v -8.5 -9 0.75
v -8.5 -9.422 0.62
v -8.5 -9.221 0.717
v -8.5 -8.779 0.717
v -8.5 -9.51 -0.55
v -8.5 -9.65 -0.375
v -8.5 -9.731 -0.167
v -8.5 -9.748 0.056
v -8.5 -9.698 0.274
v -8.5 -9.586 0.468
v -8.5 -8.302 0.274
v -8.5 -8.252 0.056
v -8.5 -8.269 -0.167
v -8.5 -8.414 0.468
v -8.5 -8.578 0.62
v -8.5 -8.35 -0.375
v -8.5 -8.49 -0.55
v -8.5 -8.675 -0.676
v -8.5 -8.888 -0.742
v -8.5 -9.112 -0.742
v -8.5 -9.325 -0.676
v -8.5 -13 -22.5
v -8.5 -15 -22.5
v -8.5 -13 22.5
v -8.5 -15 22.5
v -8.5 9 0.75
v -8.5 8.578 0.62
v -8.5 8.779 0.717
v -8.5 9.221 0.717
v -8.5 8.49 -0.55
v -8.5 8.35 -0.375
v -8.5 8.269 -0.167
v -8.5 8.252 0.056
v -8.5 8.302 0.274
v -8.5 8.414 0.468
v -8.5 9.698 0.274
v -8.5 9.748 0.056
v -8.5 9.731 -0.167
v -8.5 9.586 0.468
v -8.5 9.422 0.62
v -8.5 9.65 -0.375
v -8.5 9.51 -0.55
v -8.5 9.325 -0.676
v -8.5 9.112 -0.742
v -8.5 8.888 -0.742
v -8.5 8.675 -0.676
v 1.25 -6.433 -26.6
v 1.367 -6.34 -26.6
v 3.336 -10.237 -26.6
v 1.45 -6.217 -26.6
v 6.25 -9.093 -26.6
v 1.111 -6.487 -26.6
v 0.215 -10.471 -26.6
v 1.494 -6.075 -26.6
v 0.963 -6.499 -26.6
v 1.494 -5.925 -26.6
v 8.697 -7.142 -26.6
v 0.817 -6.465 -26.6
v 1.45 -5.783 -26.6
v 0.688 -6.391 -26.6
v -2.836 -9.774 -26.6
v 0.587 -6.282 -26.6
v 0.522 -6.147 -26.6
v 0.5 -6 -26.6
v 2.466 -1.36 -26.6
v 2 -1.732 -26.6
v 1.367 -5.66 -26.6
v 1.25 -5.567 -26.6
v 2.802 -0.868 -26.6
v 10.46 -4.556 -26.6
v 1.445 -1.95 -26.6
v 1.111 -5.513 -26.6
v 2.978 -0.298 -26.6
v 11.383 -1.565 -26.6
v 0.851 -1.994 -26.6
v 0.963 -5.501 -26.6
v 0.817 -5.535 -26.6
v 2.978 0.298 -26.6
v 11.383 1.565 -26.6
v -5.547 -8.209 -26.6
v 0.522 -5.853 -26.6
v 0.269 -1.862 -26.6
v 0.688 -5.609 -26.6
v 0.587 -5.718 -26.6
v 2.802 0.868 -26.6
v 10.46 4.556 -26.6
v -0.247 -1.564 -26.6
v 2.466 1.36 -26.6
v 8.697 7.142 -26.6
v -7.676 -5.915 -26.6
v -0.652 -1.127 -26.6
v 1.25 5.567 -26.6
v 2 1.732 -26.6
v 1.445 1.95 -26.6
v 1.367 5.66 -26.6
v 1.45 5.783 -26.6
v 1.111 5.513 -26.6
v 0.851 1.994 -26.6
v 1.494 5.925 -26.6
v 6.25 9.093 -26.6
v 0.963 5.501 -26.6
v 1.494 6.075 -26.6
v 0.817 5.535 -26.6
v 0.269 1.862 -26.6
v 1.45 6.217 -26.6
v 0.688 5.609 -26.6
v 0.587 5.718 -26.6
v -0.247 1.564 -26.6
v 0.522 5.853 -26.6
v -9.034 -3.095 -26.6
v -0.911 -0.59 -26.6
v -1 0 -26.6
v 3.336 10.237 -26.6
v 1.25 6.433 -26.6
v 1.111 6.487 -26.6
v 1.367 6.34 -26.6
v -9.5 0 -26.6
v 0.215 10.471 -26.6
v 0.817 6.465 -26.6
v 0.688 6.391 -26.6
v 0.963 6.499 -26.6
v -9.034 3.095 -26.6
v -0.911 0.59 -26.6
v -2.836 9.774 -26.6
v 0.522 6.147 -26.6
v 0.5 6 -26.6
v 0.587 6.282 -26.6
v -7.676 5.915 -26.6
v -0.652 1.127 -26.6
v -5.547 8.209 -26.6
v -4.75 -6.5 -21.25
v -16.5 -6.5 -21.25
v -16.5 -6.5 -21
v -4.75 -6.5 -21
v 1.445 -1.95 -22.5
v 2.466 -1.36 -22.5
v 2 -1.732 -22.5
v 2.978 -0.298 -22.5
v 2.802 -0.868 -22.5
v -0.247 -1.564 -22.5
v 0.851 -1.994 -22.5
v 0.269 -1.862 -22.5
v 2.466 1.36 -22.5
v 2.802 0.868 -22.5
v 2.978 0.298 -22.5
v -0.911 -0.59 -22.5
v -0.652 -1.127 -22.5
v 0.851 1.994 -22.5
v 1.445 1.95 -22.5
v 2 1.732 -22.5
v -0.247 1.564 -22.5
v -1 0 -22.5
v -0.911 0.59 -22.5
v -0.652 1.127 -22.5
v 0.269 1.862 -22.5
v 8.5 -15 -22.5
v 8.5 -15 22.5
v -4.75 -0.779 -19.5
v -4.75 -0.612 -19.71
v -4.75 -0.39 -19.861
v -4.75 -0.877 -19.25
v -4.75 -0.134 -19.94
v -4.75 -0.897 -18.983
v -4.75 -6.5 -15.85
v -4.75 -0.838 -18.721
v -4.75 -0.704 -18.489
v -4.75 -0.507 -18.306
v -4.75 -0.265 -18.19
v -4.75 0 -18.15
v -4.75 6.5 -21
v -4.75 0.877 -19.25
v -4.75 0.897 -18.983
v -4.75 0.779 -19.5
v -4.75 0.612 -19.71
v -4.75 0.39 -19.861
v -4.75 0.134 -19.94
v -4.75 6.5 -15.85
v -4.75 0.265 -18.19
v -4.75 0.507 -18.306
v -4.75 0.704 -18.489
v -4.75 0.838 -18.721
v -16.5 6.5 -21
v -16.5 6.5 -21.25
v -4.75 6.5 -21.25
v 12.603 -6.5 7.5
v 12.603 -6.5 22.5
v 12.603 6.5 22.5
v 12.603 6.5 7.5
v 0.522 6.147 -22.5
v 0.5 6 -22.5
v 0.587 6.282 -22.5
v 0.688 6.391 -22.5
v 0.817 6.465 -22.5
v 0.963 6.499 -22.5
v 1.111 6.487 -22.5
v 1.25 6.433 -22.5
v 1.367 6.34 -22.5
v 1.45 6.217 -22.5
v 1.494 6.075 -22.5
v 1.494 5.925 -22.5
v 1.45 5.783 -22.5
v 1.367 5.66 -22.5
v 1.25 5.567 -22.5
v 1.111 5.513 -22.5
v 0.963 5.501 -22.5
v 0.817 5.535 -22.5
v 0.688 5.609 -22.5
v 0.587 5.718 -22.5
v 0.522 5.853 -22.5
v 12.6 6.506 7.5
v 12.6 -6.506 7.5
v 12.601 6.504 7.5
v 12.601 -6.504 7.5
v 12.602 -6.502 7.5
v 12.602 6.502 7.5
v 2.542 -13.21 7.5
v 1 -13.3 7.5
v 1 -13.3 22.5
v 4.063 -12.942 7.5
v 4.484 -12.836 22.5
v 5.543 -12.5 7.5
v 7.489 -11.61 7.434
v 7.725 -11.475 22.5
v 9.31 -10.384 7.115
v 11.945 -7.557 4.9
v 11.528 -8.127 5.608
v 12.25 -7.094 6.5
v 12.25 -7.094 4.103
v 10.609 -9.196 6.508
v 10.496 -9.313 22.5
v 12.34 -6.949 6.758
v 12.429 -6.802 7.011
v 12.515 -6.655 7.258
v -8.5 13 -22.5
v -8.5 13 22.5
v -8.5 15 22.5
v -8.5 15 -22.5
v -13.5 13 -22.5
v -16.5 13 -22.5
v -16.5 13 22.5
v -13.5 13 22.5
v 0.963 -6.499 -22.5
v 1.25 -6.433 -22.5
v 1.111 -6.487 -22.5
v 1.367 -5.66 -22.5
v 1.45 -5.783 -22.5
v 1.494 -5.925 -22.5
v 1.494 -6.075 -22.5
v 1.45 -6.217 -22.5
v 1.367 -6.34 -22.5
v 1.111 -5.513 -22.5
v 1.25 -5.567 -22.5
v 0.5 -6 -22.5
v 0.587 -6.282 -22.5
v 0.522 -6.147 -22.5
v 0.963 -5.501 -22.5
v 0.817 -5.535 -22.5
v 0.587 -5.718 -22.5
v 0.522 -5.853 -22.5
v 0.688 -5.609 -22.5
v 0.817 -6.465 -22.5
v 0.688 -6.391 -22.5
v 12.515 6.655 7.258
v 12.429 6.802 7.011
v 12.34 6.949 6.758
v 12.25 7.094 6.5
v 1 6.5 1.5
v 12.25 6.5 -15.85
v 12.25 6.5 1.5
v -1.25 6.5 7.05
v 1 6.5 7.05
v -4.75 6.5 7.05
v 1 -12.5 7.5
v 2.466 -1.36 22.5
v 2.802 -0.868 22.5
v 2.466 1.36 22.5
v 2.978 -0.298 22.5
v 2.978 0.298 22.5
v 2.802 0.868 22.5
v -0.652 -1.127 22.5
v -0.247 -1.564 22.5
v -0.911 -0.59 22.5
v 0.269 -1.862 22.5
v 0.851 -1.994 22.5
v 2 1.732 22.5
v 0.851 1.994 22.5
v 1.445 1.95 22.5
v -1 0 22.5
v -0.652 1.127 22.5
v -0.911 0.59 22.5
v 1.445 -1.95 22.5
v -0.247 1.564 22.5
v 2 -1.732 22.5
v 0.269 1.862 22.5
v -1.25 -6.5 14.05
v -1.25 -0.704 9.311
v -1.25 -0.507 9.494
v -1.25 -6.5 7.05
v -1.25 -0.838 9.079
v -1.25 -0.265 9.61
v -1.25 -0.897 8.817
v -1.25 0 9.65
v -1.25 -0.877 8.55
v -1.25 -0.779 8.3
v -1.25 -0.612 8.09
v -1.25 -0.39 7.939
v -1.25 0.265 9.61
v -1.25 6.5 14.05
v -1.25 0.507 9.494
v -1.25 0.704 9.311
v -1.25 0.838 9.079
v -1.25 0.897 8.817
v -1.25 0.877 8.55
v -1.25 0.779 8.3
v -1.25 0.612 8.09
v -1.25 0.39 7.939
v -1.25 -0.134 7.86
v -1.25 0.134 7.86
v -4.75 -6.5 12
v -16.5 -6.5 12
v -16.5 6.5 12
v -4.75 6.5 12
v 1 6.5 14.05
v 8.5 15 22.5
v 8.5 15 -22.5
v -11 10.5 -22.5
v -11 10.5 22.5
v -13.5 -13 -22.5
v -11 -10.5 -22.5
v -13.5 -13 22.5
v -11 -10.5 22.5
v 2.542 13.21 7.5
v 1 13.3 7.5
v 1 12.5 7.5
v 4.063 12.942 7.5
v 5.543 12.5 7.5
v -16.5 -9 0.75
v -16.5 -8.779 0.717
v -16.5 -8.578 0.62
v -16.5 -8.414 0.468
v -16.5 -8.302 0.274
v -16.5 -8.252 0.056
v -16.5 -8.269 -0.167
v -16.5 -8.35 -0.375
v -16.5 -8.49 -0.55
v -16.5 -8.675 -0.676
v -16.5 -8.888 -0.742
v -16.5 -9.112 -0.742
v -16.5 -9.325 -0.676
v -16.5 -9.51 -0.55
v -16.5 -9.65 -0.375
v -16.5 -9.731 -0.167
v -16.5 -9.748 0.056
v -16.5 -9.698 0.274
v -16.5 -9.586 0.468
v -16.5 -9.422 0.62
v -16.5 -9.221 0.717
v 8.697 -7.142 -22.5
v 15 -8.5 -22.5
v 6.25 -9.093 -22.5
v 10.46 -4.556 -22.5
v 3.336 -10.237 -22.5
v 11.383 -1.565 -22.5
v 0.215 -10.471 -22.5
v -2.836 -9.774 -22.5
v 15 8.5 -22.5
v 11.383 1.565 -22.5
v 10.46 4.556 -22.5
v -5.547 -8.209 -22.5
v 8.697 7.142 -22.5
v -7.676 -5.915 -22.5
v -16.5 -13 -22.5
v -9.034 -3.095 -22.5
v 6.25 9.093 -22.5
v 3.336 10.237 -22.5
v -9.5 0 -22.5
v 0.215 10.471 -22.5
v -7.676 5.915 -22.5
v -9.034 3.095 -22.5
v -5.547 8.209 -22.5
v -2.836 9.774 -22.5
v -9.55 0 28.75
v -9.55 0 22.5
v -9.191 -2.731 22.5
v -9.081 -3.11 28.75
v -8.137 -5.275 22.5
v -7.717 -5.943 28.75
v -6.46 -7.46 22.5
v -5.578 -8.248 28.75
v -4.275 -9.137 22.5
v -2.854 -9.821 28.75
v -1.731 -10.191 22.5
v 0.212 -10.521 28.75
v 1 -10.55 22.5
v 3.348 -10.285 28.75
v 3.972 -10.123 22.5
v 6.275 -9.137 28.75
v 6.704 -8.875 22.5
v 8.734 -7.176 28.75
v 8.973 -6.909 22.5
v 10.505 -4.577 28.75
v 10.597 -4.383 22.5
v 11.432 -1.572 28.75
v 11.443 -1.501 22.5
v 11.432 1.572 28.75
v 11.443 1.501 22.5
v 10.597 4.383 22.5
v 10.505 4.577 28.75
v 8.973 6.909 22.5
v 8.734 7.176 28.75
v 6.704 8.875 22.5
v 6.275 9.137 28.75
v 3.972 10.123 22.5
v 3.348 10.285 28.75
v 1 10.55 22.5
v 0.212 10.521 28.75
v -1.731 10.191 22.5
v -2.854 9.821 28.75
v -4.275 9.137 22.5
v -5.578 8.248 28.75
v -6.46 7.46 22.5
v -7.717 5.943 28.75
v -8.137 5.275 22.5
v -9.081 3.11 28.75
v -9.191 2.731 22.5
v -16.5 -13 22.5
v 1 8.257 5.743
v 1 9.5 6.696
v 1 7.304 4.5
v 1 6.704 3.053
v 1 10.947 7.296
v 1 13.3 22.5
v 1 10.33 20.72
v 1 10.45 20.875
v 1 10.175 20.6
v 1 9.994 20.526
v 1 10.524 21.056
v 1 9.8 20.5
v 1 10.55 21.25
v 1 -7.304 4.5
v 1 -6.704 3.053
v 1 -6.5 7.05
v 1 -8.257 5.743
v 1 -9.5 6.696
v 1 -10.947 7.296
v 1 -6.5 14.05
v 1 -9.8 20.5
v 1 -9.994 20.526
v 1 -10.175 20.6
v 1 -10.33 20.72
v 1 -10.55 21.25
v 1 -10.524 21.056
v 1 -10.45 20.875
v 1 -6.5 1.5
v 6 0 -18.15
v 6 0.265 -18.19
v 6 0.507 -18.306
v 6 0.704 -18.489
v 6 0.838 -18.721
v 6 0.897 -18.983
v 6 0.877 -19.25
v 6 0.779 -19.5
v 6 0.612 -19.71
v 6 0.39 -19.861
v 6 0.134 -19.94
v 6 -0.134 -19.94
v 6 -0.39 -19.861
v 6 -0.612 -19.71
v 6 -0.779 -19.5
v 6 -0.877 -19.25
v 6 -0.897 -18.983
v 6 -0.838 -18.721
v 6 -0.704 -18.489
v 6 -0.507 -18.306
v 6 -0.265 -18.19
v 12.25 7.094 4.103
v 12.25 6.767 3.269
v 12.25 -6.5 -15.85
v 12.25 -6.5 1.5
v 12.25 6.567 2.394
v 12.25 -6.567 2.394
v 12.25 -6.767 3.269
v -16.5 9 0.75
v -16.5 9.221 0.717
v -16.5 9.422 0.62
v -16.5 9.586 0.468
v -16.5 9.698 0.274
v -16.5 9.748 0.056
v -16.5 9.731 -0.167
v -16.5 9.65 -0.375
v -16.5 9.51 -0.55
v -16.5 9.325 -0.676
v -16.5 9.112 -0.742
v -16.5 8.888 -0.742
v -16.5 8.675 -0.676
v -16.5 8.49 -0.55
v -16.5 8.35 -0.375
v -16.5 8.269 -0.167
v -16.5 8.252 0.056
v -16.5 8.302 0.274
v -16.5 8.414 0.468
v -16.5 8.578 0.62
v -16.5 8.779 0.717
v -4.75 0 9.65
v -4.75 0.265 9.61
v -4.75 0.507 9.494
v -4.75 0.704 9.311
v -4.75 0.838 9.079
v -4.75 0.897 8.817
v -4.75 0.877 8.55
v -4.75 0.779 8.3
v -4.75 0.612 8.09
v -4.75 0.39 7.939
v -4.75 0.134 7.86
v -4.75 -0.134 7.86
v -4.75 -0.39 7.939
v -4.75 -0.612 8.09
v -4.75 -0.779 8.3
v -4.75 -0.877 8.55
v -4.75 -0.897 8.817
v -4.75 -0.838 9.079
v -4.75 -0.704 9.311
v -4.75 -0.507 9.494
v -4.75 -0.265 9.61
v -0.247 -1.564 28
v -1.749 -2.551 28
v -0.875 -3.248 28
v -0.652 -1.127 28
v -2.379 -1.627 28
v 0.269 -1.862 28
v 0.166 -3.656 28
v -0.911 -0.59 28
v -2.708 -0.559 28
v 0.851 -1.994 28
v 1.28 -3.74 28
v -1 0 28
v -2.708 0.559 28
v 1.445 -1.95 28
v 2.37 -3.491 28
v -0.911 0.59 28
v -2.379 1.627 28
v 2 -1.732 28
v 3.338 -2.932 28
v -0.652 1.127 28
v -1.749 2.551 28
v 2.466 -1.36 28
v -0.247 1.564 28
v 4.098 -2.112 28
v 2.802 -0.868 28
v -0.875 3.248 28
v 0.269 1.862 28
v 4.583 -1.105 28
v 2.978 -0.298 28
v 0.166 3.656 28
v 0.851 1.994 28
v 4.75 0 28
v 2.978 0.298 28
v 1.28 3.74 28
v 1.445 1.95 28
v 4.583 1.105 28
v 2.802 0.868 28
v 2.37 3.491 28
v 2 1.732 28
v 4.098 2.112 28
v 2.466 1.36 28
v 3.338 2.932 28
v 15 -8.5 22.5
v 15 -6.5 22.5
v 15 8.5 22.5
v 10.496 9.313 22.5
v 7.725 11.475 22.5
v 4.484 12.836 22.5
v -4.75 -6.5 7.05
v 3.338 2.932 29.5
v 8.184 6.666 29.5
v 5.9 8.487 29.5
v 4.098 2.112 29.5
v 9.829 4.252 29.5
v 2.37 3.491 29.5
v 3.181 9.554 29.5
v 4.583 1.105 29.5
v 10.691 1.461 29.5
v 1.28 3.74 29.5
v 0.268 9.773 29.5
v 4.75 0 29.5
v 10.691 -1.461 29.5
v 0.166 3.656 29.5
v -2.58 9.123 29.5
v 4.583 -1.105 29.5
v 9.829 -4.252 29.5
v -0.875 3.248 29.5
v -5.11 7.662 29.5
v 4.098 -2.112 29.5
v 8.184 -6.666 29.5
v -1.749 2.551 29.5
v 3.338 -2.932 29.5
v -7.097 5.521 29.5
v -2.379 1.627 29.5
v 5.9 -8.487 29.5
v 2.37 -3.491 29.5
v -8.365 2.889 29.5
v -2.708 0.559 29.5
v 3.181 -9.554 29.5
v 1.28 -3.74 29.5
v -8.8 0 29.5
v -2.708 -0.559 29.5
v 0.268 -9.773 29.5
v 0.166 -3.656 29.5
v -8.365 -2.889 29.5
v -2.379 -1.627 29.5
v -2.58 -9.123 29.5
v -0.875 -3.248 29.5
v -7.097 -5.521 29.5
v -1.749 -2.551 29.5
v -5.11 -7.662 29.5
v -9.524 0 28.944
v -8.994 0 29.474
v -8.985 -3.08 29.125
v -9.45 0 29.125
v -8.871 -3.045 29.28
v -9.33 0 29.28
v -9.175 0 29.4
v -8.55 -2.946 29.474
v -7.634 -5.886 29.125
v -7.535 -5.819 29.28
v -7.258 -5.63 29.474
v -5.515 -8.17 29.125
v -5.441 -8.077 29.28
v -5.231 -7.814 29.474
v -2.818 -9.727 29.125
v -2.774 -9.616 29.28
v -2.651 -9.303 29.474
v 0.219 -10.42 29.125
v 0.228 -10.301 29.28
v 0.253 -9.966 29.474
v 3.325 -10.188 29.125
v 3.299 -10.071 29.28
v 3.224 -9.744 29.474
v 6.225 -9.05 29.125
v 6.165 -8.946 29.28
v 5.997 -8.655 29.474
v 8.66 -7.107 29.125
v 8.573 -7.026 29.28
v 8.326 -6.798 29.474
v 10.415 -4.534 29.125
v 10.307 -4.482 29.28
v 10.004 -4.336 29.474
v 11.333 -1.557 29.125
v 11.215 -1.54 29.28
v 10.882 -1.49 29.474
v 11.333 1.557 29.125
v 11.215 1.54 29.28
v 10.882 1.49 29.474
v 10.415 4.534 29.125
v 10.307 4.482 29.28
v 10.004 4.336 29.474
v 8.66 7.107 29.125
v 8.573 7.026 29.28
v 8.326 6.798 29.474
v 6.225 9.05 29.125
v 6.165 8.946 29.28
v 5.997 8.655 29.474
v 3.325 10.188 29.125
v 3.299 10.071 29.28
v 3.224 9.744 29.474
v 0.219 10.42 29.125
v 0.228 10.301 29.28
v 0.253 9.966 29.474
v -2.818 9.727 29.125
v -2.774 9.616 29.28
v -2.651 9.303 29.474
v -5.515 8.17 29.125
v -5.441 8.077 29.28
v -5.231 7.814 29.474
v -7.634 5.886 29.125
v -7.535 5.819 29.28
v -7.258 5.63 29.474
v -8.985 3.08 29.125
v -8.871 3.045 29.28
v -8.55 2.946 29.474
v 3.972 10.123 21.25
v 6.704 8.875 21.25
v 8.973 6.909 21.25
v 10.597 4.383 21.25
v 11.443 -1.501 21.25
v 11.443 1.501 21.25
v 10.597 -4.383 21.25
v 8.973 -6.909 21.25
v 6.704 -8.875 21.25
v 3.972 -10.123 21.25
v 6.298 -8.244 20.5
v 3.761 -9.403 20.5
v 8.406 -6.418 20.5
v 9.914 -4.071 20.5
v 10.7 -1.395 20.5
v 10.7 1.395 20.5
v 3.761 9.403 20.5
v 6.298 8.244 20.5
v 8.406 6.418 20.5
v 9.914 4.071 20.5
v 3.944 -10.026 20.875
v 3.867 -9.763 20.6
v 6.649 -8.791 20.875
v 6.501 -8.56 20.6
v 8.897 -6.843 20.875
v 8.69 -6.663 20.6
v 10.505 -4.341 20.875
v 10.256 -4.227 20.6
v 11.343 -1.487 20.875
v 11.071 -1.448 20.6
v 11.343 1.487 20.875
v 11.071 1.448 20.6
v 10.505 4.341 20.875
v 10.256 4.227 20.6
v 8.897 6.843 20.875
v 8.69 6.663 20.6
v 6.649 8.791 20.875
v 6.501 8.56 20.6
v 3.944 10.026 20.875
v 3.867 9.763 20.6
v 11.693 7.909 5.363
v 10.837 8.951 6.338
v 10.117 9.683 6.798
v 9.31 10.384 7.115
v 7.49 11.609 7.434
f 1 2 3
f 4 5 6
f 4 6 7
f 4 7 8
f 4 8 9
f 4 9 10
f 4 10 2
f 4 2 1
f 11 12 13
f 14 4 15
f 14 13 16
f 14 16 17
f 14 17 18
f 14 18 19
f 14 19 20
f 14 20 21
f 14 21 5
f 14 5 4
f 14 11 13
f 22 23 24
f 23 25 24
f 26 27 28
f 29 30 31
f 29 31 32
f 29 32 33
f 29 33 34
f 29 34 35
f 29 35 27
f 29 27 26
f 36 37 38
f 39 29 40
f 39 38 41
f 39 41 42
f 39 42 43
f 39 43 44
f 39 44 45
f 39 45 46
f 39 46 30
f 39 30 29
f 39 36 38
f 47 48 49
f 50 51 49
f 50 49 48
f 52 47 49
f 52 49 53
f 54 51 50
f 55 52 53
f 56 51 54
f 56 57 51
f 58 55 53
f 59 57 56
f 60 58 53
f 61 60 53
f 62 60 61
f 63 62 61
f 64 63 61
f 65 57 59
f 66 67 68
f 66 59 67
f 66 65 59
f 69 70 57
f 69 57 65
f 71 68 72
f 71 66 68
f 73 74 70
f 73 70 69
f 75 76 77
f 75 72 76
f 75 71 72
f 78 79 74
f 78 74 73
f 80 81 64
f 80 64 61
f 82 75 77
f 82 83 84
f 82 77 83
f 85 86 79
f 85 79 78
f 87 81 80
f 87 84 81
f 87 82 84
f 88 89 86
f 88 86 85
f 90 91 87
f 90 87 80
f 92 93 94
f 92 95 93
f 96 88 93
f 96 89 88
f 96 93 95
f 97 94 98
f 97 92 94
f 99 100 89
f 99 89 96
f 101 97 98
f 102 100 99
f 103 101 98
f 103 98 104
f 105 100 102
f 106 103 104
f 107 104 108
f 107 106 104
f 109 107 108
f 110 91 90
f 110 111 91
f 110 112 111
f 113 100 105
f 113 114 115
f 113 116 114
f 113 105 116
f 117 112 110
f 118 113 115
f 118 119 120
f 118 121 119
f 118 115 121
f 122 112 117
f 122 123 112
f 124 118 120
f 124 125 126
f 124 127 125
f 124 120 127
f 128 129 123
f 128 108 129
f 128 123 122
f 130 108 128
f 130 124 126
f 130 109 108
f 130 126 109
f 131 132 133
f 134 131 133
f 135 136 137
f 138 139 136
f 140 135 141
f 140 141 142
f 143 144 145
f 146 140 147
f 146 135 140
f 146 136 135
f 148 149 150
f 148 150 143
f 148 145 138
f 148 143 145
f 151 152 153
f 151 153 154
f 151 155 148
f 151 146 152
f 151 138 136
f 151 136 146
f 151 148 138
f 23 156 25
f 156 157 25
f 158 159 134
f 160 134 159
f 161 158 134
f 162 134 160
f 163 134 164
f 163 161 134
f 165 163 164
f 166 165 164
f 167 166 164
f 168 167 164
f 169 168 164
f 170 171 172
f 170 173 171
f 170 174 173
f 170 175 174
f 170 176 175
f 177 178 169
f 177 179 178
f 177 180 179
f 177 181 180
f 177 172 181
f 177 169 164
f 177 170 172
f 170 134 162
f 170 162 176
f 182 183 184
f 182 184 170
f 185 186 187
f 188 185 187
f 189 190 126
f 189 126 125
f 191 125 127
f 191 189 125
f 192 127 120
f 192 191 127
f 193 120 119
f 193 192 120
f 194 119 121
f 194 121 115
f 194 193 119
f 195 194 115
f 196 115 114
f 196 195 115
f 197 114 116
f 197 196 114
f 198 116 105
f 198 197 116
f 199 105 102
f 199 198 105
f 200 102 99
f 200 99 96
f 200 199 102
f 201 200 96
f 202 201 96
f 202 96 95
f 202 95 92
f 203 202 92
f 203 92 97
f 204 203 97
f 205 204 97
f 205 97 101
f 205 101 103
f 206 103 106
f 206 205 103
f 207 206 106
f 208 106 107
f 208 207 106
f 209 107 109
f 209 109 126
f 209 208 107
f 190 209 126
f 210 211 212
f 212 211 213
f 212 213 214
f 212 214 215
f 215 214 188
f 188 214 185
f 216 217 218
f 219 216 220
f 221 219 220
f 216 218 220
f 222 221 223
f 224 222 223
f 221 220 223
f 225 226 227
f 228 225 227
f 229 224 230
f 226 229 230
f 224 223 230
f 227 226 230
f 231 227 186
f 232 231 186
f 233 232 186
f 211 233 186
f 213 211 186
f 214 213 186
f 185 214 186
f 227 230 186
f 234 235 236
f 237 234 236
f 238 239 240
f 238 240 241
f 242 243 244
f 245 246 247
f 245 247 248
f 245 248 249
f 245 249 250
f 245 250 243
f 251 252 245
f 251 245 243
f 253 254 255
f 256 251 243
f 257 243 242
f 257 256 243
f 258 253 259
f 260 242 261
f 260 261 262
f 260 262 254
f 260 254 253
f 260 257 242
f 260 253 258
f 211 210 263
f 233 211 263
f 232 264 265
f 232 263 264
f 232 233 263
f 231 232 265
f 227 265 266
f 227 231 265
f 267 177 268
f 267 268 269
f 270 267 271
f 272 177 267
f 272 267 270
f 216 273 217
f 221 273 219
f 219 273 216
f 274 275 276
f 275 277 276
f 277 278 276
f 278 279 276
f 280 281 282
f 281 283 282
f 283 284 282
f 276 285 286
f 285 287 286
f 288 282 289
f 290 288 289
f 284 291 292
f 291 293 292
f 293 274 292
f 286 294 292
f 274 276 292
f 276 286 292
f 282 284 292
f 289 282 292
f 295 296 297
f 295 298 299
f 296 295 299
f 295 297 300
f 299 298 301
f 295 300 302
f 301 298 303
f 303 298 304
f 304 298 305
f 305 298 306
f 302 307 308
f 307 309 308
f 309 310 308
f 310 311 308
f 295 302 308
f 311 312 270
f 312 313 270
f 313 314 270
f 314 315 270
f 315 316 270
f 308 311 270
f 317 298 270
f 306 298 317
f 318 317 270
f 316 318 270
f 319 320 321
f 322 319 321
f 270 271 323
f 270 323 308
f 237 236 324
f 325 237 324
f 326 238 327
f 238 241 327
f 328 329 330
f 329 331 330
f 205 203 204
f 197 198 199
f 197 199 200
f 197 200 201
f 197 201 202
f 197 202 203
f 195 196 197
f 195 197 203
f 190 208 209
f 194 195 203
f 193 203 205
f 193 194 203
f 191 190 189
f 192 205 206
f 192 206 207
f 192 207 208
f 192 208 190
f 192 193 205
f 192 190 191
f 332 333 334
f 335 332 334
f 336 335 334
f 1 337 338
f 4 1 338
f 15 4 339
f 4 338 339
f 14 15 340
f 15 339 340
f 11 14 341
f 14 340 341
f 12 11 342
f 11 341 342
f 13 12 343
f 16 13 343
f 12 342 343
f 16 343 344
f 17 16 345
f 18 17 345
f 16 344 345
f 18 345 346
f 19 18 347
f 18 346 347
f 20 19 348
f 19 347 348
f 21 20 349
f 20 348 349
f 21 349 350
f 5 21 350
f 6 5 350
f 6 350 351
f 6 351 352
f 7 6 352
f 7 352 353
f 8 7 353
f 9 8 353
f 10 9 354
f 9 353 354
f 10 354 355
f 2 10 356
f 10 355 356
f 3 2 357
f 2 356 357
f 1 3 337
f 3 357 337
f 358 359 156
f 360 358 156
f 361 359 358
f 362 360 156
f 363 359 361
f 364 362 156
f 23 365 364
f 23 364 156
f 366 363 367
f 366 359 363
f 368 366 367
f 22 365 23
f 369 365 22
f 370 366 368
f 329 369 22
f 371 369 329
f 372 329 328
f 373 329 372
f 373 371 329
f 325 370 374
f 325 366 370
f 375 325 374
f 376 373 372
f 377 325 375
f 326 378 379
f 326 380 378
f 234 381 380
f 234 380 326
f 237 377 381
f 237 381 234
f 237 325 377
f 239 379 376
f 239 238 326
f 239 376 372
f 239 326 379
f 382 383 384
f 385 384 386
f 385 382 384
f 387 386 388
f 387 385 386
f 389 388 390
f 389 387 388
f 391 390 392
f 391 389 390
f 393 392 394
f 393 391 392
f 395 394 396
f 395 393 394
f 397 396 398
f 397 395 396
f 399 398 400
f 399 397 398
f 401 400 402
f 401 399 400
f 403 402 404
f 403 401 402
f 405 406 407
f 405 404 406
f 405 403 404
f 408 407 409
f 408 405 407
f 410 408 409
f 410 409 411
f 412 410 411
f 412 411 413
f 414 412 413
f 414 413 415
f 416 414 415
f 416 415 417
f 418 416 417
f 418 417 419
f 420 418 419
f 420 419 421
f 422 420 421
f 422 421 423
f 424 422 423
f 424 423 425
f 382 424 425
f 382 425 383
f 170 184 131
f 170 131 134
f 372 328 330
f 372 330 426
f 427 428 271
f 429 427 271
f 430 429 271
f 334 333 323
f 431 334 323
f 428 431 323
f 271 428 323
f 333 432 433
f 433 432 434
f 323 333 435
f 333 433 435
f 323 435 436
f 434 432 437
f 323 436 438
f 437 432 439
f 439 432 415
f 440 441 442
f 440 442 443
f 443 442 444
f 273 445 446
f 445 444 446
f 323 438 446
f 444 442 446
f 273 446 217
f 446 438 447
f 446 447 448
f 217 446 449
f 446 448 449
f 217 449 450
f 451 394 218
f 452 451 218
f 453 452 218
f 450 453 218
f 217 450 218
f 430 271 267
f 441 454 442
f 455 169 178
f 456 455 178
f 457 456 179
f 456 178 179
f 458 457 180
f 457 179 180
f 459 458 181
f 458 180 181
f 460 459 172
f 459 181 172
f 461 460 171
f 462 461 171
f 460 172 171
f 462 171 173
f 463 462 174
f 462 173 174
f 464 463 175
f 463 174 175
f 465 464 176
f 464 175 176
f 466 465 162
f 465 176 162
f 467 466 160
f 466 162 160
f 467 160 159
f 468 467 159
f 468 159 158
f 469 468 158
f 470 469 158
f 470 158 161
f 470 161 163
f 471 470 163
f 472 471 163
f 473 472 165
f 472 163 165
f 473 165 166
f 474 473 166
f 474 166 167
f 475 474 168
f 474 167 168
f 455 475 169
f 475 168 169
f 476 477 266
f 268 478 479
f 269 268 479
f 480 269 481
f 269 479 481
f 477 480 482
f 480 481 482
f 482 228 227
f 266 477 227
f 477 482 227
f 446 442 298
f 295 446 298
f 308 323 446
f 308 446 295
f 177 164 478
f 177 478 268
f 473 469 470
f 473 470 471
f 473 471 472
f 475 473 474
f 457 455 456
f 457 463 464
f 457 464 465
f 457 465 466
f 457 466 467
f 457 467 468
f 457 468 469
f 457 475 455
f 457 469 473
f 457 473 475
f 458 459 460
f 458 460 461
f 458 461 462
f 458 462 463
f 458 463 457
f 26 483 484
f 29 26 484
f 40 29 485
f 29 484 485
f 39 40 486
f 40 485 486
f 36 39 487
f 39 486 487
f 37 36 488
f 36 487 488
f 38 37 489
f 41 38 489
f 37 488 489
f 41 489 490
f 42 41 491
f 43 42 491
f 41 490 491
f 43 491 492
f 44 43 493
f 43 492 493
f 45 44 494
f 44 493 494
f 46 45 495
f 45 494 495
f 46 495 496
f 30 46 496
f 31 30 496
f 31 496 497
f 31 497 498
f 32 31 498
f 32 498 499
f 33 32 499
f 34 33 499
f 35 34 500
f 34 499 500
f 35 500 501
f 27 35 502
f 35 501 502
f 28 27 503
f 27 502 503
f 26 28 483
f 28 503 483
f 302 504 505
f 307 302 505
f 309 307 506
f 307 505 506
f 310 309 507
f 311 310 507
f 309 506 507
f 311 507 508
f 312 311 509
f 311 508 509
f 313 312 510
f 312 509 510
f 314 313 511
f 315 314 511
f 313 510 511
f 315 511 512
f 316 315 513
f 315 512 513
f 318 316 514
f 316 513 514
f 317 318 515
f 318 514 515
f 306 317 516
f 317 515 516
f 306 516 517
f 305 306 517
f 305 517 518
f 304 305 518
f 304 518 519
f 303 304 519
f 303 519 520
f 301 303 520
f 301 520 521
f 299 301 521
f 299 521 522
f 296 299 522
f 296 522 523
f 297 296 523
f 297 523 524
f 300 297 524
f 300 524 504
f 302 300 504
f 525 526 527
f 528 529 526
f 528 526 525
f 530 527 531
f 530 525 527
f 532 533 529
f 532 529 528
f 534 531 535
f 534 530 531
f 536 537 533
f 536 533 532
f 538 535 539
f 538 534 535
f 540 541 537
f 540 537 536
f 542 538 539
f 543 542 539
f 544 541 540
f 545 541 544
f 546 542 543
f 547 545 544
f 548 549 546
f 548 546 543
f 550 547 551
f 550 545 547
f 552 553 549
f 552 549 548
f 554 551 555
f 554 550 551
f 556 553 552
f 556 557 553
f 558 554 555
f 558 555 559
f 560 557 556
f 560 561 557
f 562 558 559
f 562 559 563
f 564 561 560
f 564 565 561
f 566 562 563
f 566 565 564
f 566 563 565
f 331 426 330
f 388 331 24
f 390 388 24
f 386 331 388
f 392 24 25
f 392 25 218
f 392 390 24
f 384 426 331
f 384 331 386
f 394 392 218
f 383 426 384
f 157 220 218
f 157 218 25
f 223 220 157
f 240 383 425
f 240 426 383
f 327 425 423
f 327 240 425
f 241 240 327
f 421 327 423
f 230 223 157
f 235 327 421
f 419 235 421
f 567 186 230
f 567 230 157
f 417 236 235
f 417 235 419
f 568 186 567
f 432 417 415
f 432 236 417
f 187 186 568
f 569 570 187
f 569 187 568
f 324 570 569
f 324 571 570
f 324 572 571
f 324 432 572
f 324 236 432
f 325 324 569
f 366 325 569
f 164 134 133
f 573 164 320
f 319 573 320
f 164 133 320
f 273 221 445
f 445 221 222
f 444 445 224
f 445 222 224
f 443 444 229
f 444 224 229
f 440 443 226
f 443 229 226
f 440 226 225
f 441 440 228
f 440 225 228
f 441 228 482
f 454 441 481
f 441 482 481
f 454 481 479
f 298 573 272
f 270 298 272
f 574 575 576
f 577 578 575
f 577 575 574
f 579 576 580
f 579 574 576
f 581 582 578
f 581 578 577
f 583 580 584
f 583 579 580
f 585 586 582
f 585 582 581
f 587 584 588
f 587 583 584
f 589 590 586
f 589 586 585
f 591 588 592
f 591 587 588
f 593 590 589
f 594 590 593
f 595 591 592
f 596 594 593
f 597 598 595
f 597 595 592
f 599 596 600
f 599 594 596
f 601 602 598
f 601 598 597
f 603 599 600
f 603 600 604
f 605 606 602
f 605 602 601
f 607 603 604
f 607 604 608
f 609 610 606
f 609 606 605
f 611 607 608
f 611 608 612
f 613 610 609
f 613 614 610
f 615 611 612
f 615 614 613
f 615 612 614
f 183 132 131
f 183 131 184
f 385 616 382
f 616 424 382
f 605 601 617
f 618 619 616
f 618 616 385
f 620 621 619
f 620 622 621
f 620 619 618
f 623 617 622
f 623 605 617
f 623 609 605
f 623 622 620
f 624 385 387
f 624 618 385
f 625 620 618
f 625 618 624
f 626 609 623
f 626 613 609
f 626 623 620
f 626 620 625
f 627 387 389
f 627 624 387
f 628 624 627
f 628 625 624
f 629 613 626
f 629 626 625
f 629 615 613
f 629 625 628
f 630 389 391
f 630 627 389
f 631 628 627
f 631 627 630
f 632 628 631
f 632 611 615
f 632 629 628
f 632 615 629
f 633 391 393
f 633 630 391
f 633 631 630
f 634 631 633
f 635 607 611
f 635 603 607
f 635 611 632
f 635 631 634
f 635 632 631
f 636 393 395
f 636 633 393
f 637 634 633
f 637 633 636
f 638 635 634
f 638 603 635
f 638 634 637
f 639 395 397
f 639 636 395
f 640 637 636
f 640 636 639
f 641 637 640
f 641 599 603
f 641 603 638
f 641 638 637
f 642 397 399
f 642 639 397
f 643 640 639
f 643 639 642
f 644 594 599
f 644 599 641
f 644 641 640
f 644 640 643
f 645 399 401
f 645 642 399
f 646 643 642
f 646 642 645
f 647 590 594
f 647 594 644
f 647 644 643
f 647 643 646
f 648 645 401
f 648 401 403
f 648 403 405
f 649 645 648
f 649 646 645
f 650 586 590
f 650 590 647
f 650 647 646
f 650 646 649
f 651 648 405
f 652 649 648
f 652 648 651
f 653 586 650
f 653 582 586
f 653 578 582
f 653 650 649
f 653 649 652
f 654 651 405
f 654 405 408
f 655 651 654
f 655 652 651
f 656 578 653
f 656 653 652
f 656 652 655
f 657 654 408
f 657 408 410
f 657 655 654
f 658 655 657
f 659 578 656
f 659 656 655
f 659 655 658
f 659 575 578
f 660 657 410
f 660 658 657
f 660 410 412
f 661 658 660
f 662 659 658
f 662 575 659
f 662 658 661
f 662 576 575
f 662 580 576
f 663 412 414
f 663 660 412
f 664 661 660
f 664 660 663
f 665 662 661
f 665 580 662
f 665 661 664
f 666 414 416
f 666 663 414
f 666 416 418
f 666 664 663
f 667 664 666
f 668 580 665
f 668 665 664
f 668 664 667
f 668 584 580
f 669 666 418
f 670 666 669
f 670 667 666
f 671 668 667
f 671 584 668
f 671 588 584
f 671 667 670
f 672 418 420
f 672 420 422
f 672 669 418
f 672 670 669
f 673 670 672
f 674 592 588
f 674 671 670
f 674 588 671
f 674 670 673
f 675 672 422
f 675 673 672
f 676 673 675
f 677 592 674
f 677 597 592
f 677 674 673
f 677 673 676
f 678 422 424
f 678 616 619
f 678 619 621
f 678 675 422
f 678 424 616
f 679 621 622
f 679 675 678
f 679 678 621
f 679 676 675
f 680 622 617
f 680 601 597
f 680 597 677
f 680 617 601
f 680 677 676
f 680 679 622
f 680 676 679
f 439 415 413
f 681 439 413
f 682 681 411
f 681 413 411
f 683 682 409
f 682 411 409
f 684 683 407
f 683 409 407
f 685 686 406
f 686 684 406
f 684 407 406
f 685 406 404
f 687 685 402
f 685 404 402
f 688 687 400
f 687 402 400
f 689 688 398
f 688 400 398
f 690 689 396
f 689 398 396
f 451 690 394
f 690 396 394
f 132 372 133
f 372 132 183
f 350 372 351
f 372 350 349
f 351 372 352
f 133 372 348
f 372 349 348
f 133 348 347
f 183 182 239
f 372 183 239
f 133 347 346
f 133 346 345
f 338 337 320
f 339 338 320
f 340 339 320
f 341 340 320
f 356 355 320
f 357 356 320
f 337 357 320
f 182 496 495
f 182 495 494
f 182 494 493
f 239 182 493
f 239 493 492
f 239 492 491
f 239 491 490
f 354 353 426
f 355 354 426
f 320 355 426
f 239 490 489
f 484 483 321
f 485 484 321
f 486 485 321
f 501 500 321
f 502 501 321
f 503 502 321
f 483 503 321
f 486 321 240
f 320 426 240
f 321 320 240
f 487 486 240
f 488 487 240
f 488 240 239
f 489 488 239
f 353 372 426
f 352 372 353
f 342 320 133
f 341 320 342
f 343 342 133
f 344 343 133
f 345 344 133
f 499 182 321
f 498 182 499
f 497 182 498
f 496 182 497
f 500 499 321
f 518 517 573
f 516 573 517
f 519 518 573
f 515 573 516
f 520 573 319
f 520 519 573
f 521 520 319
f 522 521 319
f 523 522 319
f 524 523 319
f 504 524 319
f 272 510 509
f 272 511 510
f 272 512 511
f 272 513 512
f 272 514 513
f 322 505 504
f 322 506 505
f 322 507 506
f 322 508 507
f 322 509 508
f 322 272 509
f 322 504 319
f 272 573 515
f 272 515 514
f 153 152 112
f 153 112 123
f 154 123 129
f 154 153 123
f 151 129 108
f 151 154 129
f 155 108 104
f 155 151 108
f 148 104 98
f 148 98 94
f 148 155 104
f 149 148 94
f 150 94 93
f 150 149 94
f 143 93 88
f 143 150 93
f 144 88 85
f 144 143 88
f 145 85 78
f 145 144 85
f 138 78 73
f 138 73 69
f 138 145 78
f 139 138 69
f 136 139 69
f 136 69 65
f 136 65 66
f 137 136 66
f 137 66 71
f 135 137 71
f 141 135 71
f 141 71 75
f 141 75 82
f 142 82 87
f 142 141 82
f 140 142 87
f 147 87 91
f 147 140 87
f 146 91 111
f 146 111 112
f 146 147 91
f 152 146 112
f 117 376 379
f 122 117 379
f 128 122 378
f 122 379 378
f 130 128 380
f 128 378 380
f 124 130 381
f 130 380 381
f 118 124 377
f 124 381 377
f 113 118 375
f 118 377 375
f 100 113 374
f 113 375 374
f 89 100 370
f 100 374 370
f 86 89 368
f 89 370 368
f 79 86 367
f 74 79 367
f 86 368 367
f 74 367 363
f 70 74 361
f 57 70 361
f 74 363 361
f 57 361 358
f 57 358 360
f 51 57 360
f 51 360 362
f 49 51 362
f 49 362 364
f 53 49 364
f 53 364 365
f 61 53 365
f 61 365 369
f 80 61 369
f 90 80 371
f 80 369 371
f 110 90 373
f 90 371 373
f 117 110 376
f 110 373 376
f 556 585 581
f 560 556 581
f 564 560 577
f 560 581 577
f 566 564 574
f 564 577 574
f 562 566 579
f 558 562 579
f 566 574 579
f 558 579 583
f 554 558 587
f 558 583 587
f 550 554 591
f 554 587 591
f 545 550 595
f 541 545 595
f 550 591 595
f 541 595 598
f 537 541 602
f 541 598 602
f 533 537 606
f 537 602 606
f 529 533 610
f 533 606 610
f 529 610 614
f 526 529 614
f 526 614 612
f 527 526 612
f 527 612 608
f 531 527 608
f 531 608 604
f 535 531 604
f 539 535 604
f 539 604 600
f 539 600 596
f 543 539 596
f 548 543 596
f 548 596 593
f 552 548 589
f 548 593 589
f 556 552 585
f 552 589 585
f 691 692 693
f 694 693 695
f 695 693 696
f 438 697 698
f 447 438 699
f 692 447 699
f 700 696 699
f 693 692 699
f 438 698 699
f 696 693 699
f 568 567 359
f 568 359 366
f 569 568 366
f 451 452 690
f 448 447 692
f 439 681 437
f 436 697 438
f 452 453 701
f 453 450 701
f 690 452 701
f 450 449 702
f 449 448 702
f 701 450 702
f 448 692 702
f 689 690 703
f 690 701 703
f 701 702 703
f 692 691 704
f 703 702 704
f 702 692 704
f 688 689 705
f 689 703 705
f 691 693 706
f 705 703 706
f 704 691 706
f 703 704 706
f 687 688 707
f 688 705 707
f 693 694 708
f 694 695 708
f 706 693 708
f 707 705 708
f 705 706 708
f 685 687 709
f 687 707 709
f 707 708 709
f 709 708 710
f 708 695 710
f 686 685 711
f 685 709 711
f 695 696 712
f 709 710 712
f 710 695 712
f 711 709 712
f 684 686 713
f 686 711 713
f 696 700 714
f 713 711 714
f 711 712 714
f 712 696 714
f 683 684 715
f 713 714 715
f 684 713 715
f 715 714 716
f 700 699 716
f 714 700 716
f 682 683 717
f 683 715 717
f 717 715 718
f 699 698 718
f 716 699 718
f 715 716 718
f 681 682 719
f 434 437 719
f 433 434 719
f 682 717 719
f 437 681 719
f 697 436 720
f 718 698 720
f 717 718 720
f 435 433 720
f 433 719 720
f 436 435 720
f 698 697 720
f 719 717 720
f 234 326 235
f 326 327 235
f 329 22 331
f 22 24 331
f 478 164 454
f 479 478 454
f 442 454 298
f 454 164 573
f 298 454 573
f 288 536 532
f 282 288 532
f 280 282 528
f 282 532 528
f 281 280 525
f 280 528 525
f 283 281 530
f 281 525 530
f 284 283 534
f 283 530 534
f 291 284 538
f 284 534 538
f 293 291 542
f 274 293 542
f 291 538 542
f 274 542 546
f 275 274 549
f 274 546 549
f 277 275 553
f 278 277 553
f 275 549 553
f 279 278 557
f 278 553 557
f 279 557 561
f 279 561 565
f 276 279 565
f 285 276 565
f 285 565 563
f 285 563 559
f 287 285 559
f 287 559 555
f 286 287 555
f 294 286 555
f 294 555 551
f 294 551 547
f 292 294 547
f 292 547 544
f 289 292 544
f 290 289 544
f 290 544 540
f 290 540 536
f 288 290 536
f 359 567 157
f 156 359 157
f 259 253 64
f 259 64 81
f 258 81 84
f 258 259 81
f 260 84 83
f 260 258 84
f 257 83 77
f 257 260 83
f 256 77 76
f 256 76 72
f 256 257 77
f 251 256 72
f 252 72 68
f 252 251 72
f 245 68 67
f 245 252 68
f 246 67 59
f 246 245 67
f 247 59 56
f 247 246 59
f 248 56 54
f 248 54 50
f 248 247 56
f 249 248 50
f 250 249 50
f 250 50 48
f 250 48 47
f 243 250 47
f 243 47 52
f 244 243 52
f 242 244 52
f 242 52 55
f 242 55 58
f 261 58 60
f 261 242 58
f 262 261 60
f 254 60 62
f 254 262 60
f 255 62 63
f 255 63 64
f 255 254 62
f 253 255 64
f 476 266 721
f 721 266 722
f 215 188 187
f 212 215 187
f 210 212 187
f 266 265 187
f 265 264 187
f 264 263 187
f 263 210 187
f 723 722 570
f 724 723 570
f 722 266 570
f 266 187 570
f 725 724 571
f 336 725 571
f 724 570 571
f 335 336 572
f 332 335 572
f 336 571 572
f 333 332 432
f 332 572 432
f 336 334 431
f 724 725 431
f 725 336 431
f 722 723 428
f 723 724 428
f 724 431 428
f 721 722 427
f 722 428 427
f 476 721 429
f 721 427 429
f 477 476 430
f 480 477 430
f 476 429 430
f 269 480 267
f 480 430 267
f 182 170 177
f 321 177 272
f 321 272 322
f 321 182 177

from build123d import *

# Parameters (mm, degrees)
BOSS_EXTRUDE1_DEPTH = 22.5
SKETCH2_R           = 10.5
SKETCH2_R_2         = 2
SKETCH2_R_3         = 0.5
BOSS_EXTRUDE2_DEPTH = 4.1
BOSS_EXTRUDE3_START = 7
SKETCH4_R           = 10.55
SKETCH4_R_2         = 2
BOSS_EXTRUDE3_DEPTH = 7
SKETCH5_R           = 3.75
CUT_EXTRUDE1_DEPTH  = 1.5
CUT_EXTRUDE2_DEPTH  = 15
SKETCH8_W           = 33
SKETCH8_H           = 13
CUT_EXTRUDE4_DEPTH  = 11.75
SKETCH9_W           = 22.9
SKETCH9_H           = 13
CUT_EXTRUDE5_DEPTH  = 17
SKETCH10_R          = 0.75
CUT_EXTRUDE6_DEPTH  = 8
SKETCH11_R          = 0.9
CUT_EXTRUDE7_DEPTH  = 10.75
CUT_EXTRUDE8_DEPTH  = 13
FILLET2_R           = 0.75
SKETCH14_W          = 13.5
SKETCH14_H          = 13
CUT_EXTRUDE9_DEPTH  = 7
FILLET3_R           = 6
SKETCH15_W          = 2
SKETCH15_H          = 20.442632008
CUT_EXTRUDE10_DEPTH = 54.926431367
SKETCH16_W          = 2.396552237
SKETCH16_H          = 13
BOSS_EXTRUDE5_DEPTH = 15
CHAMFER1_SIZE       = 0.35
CHAMFER1_SIZE_2     = 1
SKETCH17_W          = 0.25
SKETCH17_H          = 13
CUT_EXTRUDE11_DEPTH = 11.75


with BuildPart() as part:
    # Sketch1 → Boss-Extrude1 (new, symmetric)
    with BuildSketch(Plane.XY):
        Polygon((8.5, 15), (16, 7.5), (16, -7.5), (8.5, -15), (-8.5, -15), (-8.5, -13), (-11, -10.5), (-13.5, -13), (-16.5, -13), (-16.5, 13), (-13.5, 13), (-11, 10.5), (-8.5, 13), (-8.5, 15), align=None)
    extrude(amount=BOSS_EXTRUDE1_DEPTH, both=True)

    # Sketch2 → Boss-Extrude2 (add)
    with BuildSketch(Plane(origin=(0, 0, -22.5), x_dir=(-1, 0, 0), z_dir=(0, 0, -1))):
        with Locations((-1, 0)):
            Circle(SKETCH2_R)
        with Locations((-1, 0)):
            Circle(SKETCH2_R_2, mode=Mode.SUBTRACT)
        with Locations((-1, 6)):
            Circle(SKETCH2_R_3, mode=Mode.SUBTRACT)
        with Locations((-1, -6)):
            Circle(SKETCH2_R_3, mode=Mode.SUBTRACT)
    extrude(amount=BOSS_EXTRUDE2_DEPTH)

    # Sketch4 → Boss-Extrude3 (add)
    with BuildSketch(Plane.XY.offset(22.5).offset(BOSS_EXTRUDE3_START)):
        with Locations(Location((1, 0, 0), (0, 0, 180))):
            Circle(SKETCH4_R)
        with Locations(Location((1, 0, 0), (0, 0, 180))):
            Circle(SKETCH4_R_2, mode=Mode.SUBTRACT)
    extrude(amount=-BOSS_EXTRUDE3_DEPTH)

    # Sketch5 → Cut-Extrude1 (cut)
    with BuildSketch(Plane.XY.offset(29.5)):
        with Locations((1, 0)):
            Circle(SKETCH5_R)
    extrude(amount=-CUT_EXTRUDE1_DEPTH, mode=Mode.SUBTRACT)

    # Sketch6 → Cut-Extrude2 (cut)
    with BuildSketch(Plane.XY.offset(22.5)):
        with BuildLine():
            Line((1, 13.3), (1, 10.55))
            ThreePointArc((1, 10.55), (11.55, 0), (1, -10.55))
            Line((1, -10.55), (1, -13.3))
            ThreePointArc((1, -13.3), (14.3, 0), (1, 13.3))
        make_face()
    extrude(amount=-CUT_EXTRUDE2_DEPTH, mode=Mode.SUBTRACT)

    # Sketch8 → Cut-Extrude4 (cut)
    with BuildSketch(Plane.ZY.offset(16.5)):
        with Locations((-4.5, 0)):
            Rectangle(SKETCH8_W, SKETCH8_H)
    extrude(amount=-CUT_EXTRUDE4_DEPTH, mode=Mode.SUBTRACT)

    # Sketch9 → Cut-Extrude5 (cut)
    with BuildSketch(Plane.ZY.offset(4.75)):
        with Locations((-4.4, 0)):
            Rectangle(SKETCH9_W, SKETCH9_H)
    extrude(amount=-CUT_EXTRUDE5_DEPTH, mode=Mode.SUBTRACT)

    # Sketch10 → Cut-Extrude6 (cut)
    with BuildSketch(Plane.ZY.offset(16.5)):
        with Locations((0, 9)):
            Circle(SKETCH10_R)
        with Locations((0, -9)):
            Circle(SKETCH10_R)
    extrude(amount=-CUT_EXTRUDE6_DEPTH, mode=Mode.SUBTRACT)

    # Sketch11 → Cut-Extrude7 (cut)
    with BuildSketch(Plane.ZY.offset(4.75)):
        with Locations((-19.05, 0)):
            Circle(SKETCH11_R)
        with Locations((8.75, 0)):
            Circle(SKETCH11_R)
    extrude(amount=-CUT_EXTRUDE7_DEPTH, mode=Mode.SUBTRACT)

    # Sketch12 → Cut-Extrude8 (cut)
    with BuildSketch(Plane.XY.offset(20.5)):
        with BuildLine():
            Line((1, 13.3), (1, -13.3))
            ThreePointArc((1, -13.3), (14.3, 0), (1, 13.3))
        make_face()
    extrude(amount=-CUT_EXTRUDE8_DEPTH, mode=Mode.SUBTRACT)

    # Fillet2
    fillet2_edges = [part.edges().sort_by_distance(p)[0] for p in [
        (11.55, 0, 20.5),
        (11.55, 0, 29.5),
    ]]
    fillet(fillet2_edges, radius=FILLET2_R)

    # Sketch14 → Cut-Extrude9 (cut)
    with BuildSketch(Plane(origin=(0, 0, 7.05), x_dir=(-1, 0, 0), z_dir=(0, 0, -1))):
        with Locations((-5.5, 0)):
            Rectangle(SKETCH14_W, SKETCH14_H)
    extrude(amount=-CUT_EXTRUDE9_DEPTH, mode=Mode.SUBTRACT)

    # Fillet3
    # the kernel refuses this fillet: 6 mm, written as the material it takes off along each edge
    with BuildSketch(Plane(origin=(1, 6.5, 7.5), x_dir=(0, 0, -1), z_dir=(1, 0, 0))) as fillet3_piece_1_section:
        with BuildLine():
            CenterArc((FILLET3_R, FILLET3_R), FILLET3_R, 180, 90)
            Line((0, FILLET3_R), (0, 0))
            Line((0, 0), (FILLET3_R, 0))
        make_face()
    fillet3_piece_1 = extrude(amount=8.309783391, mode=Mode.PRIVATE)
    fillet3_piece_1 = fillet3_piece_1 & Plane(origin=(1, 0, 5.762056744), x_dir=(0, -1, 0), z_dir=(0, 0, 1)) * Cylinder(13.3, 41, mode=Mode.PRIVATE)
    add(fillet3_piece_1, mode=Mode.SUBTRACT)
    with BuildSketch(Plane(origin=(9.309783391, -6.5, 7.5), x_dir=(0, -1, 0), z_dir=(-1, 0, 0))) as fillet3_piece_2_section:
        with BuildLine():
            CenterArc((FILLET3_R, -FILLET3_R), FILLET3_R, 90, 90)
            Line((0, -FILLET3_R), (0, 0))
            Line((0, 0), (FILLET3_R, 0))
        make_face()
    fillet3_piece_2 = extrude(amount=8.309783391, mode=Mode.PRIVATE)
    fillet3_piece_2 = fillet3_piece_2 & Plane(origin=(1, 0, 7.288583483), x_dir=(0, -1, 0), z_dir=(0, 0, 1)) * Cylinder(13.3, 41, mode=Mode.PRIVATE)
    add(fillet3_piece_2, mode=Mode.SUBTRACT)
    with BuildSketch(Plane(origin=(12.25, -6.5, 7.5), x_dir=(0, 0, -1), z_dir=(-1, 0, 0))) as fillet3_piece_3_section:
        with BuildLine():
            CenterArc((FILLET3_R, FILLET3_R), FILLET3_R, 180, 90)
            Line((0, FILLET3_R), (0, 0))
            Line((0, 0), (FILLET3_R, 0))
        make_face()
    fillet3_piece_3 = extrude(amount=2.940216609, mode=Mode.PRIVATE)
    fillet3_piece_3 = fillet3_piece_3 & Plane(origin=(1, 0, 5.940678517), x_dir=(0, -1, 0), z_dir=(0, 0, 1)) * Cylinder(13.3, 30, mode=Mode.PRIVATE)
    add(fillet3_piece_3, mode=Mode.SUBTRACT)
    with BuildSketch(Plane(origin=(9.309783391, 6.5, 7.5), x_dir=(0, 0, -1), z_dir=(1, 0, 0))) as fillet3_piece_4_section:
        with BuildLine():
            CenterArc((FILLET3_R, FILLET3_R), FILLET3_R, 180, 90)
            Line((0, FILLET3_R), (0, 0))
            Line((0, 0), (FILLET3_R, 0))
        make_face()
    fillet3_piece_4 = extrude(amount=2.940216609, mode=Mode.PRIVATE)
    fillet3_piece_4 = fillet3_piece_4 & Plane(origin=(1, 0, 5.940678478), x_dir=(0, -1, 0), z_dir=(0, 0, 1)) * Cylinder(13.3, 30, mode=Mode.PRIVATE)
    add(fillet3_piece_4, mode=Mode.SUBTRACT)

    # Sketch15 → Cut-Extrude10 (cut, through all)
    with BuildSketch(Plane.XY.offset(22.5)):
        with Locations((16, 0)):
            Rectangle(SKETCH15_W, SKETCH15_H)
    extrude(amount=-CUT_EXTRUDE10_DEPTH, mode=Mode.SUBTRACT)

    # Sketch16 → Boss-Extrude5 (add)
    with BuildSketch(Plane.XY.offset(22.5)):
        with Locations((13.801723882, 0)):
            Rectangle(SKETCH16_W, SKETCH16_H)
    extrude(amount=-BOSS_EXTRUDE5_DEPTH)

    # Chamfer1
    # the kernel refuses this chamfer: 1, 0.35 mm, written as the material it takes off along each edge
    with BuildSketch(Plane(origin=(12.25, 6.5, 7.5), x_dir=(0.9946410899892074, 0, 0.10338811394488918), z_dir=(0, -1, 0))) as chamfer1_piece_1:
        Polygon((CHAMFER1_SIZE * 0.994641089989, -CHAMFER1_SIZE * 0.103388113945), (-CHAMFER1_SIZE_2 * 0.103388113945, -CHAMFER1_SIZE_2 * 0.994641089989), (0, 0), align=None)
    extrude(amount=13, mode=Mode.SUBTRACT)
    with BuildSketch(Plane(origin=(12.25, 9.688783911, 7.5), x_dir=(0.9946410899892074, 0, 0.10338811394488918), z_dir=(0, -1, 0))) as chamfer1_piece_2_section:
        Polygon((CHAMFER1_SIZE * 0.994641089989, -CHAMFER1_SIZE * 0.103388113945), (-CHAMFER1_SIZE_2 * 0.103388113945, -CHAMFER1_SIZE_2 * 0.994641089989), (0, 0), align=None)
    chamfer1_piece_2 = extrude(amount=3.188783911, mode=Mode.PRIVATE)
    chamfer1_piece_2 = chamfer1_piece_2 & Plane(origin=(1, 0, 7.126715107), x_dir=(0, -1, 0), z_dir=(0, 0, 1)) * Cylinder(13.3, 11, mode=Mode.PRIVATE)
    add(chamfer1_piece_2, mode=Mode.SUBTRACT)
    with BuildSketch(Plane(origin=(12.25, -9.688783911, 7.5), x_dir=(0.9946410899892074, 0, 0.10338811394488918), z_dir=(0, 1, 0))) as chamfer1_piece_3_section:
        Polygon((CHAMFER1_SIZE * 0.994641089989, CHAMFER1_SIZE * 0.103388113945), (-CHAMFER1_SIZE_2 * 0.103388113945, CHAMFER1_SIZE_2 * 0.994641089989), (0, 0), align=None)
    chamfer1_piece_3 = extrude(amount=3.188783911, mode=Mode.PRIVATE)
    chamfer1_piece_3 = chamfer1_piece_3 & Plane(origin=(1, 0, 7.126715107), x_dir=(0, -1, 0), z_dir=(0, 0, 1)) * Cylinder(13.3, 11, mode=Mode.PRIVATE)
    add(chamfer1_piece_3, mode=Mode.SUBTRACT)

    # Sketch17 → Cut-Extrude11 (cut)
    with BuildSketch(Plane.ZY.offset(16.5)):
        with Locations((-21.125, 0)):
            Rectangle(SKETCH17_W, SKETCH17_H)
    extrude(amount=-CUT_EXTRUDE11_DEPTH, mode=Mode.SUBTRACT)


solid = part.part
